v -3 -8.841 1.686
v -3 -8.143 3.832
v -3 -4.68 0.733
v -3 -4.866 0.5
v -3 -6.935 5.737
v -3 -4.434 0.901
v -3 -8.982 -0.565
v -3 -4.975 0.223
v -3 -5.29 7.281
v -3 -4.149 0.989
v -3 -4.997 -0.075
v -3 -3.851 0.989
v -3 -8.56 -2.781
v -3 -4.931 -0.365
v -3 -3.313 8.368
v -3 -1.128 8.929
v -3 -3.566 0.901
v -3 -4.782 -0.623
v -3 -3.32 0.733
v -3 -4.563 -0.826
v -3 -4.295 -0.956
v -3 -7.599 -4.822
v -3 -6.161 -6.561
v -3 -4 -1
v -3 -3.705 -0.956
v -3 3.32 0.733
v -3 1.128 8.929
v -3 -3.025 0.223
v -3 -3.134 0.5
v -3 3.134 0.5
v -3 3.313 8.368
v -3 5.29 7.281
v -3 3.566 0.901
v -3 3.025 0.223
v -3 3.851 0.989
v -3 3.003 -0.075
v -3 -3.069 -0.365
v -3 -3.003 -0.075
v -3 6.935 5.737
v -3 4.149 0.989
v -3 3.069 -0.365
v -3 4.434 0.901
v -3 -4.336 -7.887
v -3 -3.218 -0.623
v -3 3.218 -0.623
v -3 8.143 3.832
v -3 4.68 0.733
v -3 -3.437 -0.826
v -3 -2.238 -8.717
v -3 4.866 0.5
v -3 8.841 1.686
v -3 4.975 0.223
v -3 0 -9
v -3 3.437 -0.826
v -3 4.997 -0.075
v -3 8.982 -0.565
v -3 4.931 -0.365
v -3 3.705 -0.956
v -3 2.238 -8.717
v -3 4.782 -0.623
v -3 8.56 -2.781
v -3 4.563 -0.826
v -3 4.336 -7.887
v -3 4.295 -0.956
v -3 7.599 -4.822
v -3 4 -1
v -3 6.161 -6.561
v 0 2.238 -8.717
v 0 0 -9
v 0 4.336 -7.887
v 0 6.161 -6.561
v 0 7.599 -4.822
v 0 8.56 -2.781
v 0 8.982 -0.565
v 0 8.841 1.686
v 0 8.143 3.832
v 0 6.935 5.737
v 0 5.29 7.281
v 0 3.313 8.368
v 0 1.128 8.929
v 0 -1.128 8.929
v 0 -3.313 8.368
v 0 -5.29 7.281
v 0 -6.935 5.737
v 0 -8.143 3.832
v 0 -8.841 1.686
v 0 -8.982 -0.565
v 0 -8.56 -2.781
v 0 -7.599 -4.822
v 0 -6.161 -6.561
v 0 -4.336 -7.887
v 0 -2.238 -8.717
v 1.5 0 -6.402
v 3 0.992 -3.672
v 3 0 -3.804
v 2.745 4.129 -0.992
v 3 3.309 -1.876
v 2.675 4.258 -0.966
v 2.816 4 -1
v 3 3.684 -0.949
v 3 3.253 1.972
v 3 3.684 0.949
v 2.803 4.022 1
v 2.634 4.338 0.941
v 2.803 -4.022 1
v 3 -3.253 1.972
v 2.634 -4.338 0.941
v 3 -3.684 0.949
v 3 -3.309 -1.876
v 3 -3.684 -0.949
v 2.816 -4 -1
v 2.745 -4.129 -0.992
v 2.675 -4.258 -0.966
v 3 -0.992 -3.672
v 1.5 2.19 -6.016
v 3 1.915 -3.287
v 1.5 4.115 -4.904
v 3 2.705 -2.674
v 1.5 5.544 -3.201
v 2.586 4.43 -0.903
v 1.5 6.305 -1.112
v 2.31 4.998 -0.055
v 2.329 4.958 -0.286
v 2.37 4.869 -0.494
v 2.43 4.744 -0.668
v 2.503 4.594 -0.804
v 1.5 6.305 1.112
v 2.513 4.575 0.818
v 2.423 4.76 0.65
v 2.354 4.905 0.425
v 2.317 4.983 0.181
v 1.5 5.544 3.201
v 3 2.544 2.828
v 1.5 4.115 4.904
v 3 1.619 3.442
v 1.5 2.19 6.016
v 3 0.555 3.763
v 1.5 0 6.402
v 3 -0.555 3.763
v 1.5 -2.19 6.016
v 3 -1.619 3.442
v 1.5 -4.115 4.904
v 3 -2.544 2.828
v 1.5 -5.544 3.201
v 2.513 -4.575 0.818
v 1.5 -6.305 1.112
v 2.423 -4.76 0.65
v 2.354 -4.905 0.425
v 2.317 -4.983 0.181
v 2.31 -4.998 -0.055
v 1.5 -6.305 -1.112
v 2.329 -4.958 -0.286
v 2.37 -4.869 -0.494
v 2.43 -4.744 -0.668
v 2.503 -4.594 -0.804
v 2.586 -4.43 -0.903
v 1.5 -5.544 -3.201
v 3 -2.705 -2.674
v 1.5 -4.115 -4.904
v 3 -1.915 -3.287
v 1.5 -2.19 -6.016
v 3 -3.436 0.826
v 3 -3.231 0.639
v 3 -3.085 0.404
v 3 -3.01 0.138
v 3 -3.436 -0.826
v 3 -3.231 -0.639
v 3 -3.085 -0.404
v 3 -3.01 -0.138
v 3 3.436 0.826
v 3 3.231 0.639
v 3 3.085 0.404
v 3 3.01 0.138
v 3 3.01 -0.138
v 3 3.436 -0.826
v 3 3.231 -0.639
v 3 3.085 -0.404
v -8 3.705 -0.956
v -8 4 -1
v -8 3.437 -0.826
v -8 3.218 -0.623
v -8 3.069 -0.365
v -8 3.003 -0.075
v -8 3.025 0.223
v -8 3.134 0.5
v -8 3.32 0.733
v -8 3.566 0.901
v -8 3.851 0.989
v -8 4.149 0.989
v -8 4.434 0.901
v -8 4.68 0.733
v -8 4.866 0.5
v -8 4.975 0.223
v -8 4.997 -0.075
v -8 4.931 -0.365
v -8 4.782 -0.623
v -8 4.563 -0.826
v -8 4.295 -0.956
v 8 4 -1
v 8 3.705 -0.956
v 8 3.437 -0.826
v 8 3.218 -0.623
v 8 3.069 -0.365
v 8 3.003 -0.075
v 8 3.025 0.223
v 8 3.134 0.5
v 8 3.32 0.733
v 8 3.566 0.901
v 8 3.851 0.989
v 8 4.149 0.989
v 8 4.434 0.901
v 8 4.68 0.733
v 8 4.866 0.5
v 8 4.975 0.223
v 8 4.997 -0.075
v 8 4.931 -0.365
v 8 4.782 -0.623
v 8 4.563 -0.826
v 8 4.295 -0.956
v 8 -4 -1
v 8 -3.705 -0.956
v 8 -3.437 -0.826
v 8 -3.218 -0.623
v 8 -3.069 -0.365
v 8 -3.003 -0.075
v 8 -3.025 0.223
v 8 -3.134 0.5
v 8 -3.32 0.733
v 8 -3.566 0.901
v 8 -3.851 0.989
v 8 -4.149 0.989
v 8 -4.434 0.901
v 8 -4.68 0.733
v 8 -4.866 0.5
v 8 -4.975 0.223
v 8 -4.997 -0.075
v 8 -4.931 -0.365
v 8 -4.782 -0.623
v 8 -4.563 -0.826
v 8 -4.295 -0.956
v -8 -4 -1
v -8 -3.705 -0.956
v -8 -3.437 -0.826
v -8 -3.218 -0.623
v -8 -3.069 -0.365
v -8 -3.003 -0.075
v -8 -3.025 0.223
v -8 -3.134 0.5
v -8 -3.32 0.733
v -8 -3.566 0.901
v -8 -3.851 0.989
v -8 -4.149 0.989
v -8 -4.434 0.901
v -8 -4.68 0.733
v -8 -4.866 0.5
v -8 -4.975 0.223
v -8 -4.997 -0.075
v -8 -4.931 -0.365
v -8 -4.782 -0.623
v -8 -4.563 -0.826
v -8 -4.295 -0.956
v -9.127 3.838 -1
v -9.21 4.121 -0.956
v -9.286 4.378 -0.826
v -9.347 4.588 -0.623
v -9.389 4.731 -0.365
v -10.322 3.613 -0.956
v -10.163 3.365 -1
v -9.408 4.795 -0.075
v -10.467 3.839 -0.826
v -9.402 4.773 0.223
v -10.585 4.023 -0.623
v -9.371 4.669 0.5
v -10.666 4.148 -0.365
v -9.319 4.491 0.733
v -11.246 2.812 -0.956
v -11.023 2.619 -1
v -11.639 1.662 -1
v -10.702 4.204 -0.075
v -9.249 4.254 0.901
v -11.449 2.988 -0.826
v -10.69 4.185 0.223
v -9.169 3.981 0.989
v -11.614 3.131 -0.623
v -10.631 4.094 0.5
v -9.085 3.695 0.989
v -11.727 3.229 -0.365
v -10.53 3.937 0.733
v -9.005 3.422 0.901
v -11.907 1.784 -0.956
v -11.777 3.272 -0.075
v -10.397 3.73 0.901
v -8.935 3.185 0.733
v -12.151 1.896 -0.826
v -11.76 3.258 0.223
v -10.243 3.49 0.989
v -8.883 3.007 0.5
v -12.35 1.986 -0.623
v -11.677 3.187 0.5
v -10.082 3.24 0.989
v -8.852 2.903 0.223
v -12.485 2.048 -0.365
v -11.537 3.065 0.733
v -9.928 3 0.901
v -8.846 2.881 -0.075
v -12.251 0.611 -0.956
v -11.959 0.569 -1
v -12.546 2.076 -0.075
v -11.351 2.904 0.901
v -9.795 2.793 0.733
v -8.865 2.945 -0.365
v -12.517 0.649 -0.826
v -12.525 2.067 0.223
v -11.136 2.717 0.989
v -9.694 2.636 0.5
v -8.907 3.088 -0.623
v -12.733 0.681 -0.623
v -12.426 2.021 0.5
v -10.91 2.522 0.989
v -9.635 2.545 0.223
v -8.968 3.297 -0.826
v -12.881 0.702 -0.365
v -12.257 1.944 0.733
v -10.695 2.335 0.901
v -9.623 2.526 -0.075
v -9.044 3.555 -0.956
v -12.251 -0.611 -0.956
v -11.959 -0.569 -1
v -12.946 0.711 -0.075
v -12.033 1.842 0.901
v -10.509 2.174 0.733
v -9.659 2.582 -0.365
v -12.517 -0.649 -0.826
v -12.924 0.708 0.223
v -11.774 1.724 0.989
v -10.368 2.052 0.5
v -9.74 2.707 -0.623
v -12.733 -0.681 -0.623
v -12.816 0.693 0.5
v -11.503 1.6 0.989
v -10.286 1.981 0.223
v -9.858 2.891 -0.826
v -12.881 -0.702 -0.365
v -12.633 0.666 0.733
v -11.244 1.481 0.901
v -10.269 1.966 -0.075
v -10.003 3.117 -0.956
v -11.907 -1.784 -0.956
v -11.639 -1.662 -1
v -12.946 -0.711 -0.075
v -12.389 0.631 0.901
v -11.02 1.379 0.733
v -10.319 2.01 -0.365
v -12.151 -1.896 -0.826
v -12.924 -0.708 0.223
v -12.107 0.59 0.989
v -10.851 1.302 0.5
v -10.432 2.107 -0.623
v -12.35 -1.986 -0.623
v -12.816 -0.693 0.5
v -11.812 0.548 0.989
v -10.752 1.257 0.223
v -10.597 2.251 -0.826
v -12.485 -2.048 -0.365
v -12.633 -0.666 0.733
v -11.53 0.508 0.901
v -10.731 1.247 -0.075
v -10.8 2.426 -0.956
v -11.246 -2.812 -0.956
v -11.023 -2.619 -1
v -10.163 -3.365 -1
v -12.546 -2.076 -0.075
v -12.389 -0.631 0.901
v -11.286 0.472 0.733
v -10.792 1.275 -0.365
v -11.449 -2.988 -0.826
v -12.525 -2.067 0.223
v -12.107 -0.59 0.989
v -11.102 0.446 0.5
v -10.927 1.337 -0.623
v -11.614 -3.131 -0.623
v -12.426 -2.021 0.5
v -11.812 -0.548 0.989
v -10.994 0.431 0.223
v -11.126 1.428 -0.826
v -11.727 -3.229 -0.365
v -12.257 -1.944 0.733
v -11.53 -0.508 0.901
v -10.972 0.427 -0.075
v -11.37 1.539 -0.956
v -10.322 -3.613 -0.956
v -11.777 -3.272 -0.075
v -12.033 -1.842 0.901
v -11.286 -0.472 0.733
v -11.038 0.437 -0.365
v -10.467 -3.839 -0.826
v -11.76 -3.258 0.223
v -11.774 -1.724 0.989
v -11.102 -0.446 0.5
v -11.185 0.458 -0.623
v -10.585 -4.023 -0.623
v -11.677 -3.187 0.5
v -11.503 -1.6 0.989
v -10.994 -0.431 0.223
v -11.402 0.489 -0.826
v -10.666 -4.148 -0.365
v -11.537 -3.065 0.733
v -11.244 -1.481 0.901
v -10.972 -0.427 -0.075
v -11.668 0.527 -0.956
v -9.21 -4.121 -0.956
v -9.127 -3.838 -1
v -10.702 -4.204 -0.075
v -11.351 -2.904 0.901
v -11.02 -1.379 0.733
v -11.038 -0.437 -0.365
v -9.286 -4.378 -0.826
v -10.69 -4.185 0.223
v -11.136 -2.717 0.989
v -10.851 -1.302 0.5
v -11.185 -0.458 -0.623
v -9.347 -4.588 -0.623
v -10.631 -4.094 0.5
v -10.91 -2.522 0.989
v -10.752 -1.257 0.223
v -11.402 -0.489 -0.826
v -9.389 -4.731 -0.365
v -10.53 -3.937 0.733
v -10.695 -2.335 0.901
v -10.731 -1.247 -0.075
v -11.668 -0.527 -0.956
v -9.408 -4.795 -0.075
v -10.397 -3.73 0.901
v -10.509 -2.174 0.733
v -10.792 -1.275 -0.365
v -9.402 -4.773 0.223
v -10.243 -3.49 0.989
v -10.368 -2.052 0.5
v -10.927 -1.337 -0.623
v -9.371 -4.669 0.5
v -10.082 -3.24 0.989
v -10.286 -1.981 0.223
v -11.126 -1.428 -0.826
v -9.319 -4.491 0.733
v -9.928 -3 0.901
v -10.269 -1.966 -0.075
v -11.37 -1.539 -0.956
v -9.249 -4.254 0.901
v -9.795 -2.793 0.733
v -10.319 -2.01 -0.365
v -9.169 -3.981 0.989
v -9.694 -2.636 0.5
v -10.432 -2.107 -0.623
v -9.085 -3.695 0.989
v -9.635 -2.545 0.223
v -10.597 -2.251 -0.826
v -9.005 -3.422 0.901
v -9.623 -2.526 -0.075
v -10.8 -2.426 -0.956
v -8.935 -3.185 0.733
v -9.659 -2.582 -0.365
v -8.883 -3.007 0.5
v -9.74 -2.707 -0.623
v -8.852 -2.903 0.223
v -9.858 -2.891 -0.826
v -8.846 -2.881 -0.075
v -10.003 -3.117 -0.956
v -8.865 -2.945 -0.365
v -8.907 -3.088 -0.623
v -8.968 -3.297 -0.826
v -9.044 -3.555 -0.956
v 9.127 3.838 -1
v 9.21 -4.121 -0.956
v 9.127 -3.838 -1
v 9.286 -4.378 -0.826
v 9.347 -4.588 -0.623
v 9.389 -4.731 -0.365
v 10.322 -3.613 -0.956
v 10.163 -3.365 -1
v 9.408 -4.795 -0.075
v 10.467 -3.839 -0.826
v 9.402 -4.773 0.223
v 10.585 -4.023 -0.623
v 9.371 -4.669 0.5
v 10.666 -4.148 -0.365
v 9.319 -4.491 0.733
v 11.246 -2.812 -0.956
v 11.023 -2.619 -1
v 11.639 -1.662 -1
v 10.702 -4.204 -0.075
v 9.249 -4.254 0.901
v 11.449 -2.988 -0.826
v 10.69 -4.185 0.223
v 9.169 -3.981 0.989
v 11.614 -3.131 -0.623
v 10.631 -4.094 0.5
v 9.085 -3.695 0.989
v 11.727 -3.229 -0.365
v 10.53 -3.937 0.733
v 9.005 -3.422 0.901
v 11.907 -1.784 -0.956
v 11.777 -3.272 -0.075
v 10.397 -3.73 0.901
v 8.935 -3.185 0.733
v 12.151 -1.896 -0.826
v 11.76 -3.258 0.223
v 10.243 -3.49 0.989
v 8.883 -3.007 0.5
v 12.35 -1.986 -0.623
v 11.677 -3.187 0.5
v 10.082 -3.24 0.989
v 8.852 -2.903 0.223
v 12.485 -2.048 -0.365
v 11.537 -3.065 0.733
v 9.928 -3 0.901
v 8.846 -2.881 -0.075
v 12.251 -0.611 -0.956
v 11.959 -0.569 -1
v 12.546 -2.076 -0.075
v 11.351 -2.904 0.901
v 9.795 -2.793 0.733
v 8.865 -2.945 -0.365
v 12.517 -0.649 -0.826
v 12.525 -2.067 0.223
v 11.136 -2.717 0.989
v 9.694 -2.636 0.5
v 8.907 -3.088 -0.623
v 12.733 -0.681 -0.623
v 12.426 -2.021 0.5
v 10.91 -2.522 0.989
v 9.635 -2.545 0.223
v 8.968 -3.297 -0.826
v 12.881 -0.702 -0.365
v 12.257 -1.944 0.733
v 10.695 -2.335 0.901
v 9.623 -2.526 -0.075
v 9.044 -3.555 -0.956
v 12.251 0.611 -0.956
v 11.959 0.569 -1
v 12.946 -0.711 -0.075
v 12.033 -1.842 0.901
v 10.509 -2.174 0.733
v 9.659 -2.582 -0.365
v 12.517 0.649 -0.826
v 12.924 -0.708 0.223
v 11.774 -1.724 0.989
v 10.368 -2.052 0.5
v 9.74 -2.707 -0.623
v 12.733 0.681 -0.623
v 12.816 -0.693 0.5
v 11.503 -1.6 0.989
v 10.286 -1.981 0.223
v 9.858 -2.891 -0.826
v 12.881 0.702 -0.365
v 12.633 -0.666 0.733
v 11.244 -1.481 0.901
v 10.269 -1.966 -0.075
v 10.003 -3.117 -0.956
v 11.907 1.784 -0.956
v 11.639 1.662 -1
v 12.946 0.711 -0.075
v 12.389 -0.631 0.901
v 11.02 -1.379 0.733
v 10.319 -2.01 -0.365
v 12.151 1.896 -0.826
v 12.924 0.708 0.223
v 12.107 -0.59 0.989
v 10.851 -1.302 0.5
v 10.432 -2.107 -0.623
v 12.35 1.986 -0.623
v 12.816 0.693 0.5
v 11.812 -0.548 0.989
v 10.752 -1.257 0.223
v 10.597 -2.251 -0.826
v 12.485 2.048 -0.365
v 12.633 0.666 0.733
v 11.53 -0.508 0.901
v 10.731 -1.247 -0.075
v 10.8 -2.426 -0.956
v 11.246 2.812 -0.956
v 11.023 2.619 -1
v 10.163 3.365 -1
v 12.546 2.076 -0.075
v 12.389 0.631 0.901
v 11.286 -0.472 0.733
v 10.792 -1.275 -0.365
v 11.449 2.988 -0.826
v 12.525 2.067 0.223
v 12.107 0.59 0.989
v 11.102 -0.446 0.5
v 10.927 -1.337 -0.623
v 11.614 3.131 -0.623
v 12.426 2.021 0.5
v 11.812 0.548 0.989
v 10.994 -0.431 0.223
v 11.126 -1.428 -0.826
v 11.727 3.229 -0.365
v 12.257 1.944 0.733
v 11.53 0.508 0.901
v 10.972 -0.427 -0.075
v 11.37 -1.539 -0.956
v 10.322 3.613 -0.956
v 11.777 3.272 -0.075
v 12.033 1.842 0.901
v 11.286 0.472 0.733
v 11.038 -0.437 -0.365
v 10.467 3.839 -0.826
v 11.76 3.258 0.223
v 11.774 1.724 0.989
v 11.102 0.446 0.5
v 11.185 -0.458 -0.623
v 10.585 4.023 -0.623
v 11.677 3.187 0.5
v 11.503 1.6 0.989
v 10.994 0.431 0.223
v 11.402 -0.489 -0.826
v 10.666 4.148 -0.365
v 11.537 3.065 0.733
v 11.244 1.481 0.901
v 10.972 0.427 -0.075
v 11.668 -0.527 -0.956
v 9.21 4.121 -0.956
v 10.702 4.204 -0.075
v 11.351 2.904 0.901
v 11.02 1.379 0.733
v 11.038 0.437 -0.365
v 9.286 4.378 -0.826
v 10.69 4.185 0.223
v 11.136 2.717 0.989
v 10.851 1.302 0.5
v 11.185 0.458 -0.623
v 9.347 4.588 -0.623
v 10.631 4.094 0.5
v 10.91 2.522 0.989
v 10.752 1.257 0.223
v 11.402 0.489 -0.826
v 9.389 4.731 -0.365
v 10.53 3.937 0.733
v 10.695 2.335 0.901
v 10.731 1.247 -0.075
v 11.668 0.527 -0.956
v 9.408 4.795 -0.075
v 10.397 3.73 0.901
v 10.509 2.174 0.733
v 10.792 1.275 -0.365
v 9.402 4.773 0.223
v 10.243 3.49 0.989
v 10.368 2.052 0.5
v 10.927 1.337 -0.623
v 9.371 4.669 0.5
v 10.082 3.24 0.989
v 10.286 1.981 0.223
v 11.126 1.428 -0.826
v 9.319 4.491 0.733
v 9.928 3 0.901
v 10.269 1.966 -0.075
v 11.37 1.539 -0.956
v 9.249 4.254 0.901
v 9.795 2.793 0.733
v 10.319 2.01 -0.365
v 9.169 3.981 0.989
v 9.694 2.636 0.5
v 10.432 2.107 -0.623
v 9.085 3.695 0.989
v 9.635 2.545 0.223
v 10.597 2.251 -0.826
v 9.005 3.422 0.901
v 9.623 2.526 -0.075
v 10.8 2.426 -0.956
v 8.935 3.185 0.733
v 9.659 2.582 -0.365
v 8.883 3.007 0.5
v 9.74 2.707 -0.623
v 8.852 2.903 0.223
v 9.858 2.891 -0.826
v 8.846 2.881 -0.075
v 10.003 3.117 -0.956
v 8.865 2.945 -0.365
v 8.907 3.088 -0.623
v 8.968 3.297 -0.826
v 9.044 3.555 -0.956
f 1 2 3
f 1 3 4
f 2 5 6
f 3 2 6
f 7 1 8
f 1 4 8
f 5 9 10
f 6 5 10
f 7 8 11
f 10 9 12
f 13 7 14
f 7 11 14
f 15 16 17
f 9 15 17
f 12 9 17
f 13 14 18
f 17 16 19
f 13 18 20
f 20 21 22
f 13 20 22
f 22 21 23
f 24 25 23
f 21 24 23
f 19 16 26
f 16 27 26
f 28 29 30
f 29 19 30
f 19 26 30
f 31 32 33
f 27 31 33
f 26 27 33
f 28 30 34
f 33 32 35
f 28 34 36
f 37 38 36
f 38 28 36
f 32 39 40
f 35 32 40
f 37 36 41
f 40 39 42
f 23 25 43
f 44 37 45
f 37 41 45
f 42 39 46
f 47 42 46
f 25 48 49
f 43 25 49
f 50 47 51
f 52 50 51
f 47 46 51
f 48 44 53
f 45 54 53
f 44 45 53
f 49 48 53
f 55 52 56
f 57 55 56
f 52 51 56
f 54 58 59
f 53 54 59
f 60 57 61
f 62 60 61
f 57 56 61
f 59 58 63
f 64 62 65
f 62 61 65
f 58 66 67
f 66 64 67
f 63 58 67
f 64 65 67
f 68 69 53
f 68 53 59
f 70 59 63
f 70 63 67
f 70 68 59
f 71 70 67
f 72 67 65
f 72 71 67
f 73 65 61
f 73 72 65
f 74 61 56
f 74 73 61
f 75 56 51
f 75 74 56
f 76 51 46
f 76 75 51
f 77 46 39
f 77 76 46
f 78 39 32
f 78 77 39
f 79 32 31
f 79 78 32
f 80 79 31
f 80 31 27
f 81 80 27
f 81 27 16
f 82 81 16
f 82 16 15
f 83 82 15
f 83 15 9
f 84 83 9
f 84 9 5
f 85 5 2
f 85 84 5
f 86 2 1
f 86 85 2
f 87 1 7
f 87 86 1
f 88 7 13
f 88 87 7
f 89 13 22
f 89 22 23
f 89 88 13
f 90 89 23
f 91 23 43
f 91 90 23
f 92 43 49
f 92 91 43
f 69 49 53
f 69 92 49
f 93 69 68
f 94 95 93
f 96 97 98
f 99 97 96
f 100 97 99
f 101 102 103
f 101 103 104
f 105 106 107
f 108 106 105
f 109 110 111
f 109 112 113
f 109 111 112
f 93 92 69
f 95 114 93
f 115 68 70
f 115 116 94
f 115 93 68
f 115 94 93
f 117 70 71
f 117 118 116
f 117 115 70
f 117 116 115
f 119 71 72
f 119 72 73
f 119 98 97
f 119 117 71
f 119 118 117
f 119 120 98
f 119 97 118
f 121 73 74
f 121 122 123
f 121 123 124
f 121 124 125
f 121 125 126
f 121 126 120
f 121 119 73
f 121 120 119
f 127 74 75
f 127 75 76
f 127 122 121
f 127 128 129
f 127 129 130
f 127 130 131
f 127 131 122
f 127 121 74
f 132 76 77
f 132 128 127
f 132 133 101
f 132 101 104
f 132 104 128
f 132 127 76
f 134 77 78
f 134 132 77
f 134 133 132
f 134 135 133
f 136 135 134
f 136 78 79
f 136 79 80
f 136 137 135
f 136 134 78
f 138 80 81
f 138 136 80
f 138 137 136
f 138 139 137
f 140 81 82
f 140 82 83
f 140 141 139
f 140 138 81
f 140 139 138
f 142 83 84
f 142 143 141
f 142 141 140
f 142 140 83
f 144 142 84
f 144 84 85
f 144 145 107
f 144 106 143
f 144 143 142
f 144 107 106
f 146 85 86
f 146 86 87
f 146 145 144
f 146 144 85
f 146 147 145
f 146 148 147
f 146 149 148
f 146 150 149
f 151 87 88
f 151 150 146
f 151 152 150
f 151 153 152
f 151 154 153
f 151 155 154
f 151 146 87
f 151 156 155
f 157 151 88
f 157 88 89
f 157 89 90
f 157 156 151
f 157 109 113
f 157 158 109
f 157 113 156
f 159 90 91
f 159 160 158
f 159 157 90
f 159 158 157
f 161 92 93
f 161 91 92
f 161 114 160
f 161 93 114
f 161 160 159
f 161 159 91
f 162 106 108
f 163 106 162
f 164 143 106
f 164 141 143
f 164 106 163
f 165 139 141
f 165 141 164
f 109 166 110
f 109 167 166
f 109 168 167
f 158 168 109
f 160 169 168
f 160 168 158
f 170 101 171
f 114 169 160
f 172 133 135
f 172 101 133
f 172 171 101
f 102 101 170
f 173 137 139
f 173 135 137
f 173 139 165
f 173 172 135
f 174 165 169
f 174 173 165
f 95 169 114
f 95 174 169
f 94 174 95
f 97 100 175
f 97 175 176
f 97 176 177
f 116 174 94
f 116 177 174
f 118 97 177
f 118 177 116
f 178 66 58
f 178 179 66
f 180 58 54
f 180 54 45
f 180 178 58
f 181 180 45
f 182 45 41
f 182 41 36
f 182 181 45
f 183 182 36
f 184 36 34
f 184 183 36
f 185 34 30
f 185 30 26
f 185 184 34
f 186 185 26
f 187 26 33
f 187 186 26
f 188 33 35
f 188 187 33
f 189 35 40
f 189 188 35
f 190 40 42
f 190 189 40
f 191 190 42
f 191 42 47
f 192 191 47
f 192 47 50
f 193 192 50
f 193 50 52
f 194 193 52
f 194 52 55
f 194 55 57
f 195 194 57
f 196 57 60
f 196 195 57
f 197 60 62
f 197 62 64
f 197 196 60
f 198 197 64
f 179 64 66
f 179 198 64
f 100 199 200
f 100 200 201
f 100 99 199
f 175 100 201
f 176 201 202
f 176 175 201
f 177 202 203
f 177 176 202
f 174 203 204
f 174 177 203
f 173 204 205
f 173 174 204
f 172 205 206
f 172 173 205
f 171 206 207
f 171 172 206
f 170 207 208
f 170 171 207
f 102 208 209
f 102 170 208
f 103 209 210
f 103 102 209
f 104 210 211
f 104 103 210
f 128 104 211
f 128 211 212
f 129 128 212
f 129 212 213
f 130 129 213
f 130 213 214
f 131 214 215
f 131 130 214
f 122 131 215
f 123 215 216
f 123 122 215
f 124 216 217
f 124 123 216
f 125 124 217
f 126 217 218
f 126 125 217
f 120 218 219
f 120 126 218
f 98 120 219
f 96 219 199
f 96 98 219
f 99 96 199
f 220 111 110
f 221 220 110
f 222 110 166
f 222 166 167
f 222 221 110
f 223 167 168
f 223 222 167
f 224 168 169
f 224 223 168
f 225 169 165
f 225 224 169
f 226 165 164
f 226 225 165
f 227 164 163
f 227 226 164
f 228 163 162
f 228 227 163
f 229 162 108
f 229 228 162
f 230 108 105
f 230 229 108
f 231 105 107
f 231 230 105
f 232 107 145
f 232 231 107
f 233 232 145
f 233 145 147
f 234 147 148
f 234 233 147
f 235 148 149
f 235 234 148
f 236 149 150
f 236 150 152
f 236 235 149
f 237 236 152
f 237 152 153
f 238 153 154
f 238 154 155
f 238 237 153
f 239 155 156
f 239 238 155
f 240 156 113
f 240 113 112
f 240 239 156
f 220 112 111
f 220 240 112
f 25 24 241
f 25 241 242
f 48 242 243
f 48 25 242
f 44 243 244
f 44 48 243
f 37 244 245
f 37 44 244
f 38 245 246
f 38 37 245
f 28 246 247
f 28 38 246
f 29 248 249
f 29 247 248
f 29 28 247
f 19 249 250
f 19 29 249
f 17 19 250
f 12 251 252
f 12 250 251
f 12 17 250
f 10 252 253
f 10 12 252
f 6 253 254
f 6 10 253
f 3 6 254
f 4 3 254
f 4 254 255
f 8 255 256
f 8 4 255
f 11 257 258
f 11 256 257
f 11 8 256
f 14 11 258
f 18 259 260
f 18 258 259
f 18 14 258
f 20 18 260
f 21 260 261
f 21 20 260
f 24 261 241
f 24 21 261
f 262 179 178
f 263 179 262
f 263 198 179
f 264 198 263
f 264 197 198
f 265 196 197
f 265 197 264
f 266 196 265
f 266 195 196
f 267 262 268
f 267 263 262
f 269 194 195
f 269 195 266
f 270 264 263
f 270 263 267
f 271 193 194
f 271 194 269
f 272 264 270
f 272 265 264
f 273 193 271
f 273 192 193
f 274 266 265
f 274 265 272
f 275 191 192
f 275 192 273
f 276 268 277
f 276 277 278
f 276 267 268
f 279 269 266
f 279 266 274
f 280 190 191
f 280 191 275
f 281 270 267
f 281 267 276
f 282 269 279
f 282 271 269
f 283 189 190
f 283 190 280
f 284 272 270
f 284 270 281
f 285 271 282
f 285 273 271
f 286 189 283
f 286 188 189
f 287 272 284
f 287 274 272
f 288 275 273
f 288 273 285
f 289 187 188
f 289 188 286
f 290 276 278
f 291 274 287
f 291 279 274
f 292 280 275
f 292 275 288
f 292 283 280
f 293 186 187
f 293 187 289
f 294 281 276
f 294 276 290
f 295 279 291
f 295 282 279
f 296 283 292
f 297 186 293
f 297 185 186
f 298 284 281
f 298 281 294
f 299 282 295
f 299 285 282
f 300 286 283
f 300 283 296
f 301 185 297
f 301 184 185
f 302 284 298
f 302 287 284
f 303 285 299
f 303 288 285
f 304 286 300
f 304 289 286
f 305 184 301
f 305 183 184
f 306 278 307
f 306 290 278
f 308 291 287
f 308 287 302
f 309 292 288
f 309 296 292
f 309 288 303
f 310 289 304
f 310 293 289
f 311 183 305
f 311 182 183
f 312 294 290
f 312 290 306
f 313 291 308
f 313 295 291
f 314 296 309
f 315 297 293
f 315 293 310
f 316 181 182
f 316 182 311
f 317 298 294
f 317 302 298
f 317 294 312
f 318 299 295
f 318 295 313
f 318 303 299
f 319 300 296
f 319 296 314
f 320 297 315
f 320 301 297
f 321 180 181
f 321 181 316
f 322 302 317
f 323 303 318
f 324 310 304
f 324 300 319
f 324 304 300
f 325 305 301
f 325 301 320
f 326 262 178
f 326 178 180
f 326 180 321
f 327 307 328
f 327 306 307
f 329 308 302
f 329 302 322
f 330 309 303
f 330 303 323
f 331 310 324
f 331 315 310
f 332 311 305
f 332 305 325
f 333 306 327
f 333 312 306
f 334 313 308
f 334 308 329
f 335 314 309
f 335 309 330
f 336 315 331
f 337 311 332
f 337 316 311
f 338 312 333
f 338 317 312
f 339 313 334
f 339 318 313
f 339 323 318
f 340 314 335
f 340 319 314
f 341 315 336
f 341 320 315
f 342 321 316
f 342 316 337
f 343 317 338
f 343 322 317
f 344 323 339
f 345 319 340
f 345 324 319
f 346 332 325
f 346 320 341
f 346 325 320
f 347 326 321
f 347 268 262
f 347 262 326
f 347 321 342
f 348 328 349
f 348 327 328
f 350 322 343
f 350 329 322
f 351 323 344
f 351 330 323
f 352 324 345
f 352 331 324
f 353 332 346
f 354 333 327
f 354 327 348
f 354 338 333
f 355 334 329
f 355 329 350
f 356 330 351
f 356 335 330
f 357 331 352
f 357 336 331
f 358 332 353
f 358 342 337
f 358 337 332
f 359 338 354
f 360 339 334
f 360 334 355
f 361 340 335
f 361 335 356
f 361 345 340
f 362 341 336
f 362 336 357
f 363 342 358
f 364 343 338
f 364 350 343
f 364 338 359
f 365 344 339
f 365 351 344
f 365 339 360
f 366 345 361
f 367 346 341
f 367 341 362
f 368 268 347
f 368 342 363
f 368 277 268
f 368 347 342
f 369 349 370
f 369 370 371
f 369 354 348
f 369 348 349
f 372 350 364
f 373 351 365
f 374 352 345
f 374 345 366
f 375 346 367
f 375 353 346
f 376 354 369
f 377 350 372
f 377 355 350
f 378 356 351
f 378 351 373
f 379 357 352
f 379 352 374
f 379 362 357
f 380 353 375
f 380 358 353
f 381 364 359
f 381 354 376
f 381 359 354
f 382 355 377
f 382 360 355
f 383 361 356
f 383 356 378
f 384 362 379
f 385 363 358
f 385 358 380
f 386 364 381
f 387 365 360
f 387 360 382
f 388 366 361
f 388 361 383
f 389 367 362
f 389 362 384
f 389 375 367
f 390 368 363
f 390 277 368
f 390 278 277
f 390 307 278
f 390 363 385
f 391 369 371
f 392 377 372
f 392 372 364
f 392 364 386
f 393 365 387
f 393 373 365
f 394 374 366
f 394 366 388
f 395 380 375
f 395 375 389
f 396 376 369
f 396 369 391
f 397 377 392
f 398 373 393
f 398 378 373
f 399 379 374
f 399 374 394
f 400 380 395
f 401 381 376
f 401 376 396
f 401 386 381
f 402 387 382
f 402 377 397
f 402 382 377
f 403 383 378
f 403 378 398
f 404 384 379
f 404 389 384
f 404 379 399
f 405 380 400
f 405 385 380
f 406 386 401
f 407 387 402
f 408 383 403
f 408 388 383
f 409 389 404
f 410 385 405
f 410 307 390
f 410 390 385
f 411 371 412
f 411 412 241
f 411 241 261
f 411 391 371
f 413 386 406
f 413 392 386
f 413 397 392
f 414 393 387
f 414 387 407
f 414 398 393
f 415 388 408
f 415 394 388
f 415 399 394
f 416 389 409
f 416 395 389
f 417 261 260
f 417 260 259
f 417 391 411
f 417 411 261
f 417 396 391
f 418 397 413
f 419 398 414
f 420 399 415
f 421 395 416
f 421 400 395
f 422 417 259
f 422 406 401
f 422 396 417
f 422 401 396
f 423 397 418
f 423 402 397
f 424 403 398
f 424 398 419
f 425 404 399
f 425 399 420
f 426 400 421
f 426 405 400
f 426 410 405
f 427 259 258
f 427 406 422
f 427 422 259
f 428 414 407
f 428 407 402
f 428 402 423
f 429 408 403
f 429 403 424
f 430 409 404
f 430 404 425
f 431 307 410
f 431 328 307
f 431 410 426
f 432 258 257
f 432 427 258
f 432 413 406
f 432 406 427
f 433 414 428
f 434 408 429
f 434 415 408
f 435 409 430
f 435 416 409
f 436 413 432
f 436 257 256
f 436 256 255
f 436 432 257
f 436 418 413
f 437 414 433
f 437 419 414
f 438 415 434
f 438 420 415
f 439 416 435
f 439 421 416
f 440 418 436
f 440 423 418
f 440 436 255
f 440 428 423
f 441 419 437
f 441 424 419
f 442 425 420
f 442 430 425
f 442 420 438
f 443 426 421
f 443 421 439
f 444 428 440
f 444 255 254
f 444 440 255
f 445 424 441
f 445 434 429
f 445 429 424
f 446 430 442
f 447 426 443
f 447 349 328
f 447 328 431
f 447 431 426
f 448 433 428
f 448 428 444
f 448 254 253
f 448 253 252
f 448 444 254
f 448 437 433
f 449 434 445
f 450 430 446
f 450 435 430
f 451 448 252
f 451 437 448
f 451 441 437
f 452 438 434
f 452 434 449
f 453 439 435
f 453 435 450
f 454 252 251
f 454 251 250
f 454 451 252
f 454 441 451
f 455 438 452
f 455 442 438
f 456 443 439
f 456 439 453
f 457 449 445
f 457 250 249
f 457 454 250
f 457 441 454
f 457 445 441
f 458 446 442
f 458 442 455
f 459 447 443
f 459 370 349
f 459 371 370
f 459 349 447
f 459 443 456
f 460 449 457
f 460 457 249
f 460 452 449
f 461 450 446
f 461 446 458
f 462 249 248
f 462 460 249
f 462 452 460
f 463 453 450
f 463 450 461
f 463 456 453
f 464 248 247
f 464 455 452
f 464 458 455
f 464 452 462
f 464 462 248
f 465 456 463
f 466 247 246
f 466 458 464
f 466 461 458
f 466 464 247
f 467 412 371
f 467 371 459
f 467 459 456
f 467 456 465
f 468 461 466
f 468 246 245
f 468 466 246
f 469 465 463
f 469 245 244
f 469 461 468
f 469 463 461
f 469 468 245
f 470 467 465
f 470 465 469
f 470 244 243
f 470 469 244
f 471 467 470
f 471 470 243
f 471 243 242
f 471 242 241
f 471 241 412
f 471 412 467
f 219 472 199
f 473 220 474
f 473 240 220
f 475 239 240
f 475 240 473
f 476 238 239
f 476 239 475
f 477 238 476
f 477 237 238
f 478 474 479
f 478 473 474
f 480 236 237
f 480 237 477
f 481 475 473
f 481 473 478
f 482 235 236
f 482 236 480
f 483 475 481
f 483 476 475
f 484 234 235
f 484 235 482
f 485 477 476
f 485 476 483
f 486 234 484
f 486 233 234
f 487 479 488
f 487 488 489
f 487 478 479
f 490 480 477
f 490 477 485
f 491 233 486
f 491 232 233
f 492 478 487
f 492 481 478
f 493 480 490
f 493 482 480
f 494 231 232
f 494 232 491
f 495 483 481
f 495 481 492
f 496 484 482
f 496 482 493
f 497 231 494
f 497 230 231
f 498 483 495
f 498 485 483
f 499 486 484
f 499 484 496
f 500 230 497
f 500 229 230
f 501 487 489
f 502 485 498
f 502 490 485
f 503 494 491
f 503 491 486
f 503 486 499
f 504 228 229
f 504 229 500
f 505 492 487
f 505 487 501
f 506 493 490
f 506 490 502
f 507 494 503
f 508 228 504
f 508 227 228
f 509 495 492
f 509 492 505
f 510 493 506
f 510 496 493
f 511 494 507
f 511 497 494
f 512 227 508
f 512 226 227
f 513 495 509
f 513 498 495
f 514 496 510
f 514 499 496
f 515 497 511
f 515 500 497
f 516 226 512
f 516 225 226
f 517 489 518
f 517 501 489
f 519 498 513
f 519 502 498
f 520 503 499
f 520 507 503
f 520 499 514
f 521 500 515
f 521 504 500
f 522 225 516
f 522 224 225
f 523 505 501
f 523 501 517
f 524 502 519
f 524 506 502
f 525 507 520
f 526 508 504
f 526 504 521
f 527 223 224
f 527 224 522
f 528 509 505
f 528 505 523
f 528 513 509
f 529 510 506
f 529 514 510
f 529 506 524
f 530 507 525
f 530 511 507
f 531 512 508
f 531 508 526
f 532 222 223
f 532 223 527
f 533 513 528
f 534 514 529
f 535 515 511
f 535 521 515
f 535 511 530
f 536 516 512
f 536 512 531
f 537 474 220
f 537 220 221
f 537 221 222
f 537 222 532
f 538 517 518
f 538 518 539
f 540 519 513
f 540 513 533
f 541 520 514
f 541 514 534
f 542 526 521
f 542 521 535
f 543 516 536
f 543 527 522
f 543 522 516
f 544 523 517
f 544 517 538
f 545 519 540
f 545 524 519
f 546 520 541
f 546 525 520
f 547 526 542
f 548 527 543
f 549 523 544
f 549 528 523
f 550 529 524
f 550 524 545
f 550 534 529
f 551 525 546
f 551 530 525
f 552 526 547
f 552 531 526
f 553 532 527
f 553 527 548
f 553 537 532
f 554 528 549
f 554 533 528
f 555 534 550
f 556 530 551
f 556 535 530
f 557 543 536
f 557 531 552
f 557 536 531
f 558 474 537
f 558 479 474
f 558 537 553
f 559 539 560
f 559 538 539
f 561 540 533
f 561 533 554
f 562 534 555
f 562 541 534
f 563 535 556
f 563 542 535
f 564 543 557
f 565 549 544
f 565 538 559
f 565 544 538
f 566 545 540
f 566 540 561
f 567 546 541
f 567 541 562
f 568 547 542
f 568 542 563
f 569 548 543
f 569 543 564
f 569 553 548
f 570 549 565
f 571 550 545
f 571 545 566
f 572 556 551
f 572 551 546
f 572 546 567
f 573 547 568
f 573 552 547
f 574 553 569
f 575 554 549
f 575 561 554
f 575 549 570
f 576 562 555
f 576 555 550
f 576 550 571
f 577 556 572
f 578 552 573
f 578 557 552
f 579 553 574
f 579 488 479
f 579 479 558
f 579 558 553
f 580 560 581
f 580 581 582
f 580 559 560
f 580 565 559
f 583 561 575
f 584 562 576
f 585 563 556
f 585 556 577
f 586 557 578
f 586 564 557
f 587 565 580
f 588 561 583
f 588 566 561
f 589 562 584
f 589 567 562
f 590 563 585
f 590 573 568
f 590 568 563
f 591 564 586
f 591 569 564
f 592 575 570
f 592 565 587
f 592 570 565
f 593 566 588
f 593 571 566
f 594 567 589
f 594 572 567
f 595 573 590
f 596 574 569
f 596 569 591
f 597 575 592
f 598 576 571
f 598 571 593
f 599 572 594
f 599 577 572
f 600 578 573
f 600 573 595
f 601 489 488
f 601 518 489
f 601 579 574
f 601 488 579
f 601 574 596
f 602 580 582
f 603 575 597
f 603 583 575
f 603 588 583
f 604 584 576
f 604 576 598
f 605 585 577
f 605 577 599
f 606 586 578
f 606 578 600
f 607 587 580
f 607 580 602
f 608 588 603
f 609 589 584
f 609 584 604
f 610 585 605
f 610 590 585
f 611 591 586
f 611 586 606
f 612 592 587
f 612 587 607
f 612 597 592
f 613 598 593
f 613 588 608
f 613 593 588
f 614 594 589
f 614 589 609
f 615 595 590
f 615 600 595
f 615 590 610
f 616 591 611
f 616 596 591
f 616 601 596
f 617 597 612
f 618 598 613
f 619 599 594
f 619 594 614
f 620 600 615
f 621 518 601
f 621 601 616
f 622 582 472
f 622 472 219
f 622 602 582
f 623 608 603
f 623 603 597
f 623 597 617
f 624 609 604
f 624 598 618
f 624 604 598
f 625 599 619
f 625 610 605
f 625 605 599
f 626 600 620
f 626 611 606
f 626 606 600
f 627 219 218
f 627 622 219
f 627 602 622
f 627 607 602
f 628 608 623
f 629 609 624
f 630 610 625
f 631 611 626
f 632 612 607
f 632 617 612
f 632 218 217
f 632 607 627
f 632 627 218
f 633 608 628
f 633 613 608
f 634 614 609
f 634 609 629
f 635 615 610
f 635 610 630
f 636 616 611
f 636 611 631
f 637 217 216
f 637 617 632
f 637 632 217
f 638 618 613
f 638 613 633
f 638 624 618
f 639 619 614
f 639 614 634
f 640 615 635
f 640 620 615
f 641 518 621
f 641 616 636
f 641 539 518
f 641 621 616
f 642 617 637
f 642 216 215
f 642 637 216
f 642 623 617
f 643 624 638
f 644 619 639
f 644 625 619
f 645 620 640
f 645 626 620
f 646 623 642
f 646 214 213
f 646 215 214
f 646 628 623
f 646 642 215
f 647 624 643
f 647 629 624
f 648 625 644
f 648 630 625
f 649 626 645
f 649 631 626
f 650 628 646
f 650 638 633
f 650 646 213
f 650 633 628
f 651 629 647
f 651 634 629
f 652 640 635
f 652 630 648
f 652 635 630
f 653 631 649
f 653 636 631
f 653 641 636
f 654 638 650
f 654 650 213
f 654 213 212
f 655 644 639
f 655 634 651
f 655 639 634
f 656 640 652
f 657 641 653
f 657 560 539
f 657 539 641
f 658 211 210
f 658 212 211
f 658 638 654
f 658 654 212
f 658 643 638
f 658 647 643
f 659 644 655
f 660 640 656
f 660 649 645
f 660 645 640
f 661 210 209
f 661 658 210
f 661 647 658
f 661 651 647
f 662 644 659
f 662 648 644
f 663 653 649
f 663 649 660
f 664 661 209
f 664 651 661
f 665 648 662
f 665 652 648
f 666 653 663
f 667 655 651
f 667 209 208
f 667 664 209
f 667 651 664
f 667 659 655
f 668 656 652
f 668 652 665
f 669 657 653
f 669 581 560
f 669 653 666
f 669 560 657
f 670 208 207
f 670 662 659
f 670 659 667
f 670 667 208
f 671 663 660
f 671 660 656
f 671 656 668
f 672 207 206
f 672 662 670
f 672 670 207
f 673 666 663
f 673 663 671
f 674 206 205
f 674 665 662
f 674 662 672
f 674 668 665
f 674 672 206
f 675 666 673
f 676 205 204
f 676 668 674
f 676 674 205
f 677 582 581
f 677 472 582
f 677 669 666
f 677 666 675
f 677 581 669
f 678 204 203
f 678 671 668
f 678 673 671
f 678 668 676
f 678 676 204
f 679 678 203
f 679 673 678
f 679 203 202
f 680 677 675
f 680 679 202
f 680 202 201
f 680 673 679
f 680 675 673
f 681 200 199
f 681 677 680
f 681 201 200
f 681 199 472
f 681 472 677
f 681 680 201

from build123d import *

# Parameters (mm, degrees)
SWEEP_1_PROFILE_R         = 1
SKETCH_9_R                = 9
EXTRUDE_1_DEPTH           = 3
EXTRUDE_1_TAPER           = 60
EXTRUDE_1_OTHER_WAY_DEPTH = 3


with BuildPart() as part:
    # 扫描1: sweep along a path in 草图1
    with BuildLine(Plane.XY) as sweep_1_path:
        Line((8, 4), (-8, 4))
        ThreePointArc((-8, 4), (-12, 0), (-8, -4))
        Line((-8, -4), (8, -4))
        ThreePointArc((8, -4), (12, 0), (8, 4))
    # 扫描1 profile (on start of the path) → 扫描1 (sweep)
    with BuildSketch(Plane(origin=(8, 4, 0), x_dir=(0, 0, -1), z_dir=(-1, 0, 0))):
        Circle(SWEEP_1_PROFILE_R)
    sweep(path=sweep_1_path.line)

    # 草图9 → 凸台-拉伸1 (add)
    with BuildSketch(Plane(origin=(0, 0, 0), x_dir=(0, 0, -1), z_dir=(1, 0, 0))):
        Circle(SKETCH_9_R)
    extrude(amount=EXTRUDE_1_DEPTH, taper=EXTRUDE_1_TAPER)

    # 草图9 → 凸台-拉伸1 other way (add)
    with BuildSketch(Plane(origin=(0, 0, 0), x_dir=(0, 0, -1), z_dir=(1, 0, 0))):
        Circle(SKETCH_9_R)
    extrude(amount=-EXTRUDE_1_OTHER_WAY_DEPTH)


solid = part.part
